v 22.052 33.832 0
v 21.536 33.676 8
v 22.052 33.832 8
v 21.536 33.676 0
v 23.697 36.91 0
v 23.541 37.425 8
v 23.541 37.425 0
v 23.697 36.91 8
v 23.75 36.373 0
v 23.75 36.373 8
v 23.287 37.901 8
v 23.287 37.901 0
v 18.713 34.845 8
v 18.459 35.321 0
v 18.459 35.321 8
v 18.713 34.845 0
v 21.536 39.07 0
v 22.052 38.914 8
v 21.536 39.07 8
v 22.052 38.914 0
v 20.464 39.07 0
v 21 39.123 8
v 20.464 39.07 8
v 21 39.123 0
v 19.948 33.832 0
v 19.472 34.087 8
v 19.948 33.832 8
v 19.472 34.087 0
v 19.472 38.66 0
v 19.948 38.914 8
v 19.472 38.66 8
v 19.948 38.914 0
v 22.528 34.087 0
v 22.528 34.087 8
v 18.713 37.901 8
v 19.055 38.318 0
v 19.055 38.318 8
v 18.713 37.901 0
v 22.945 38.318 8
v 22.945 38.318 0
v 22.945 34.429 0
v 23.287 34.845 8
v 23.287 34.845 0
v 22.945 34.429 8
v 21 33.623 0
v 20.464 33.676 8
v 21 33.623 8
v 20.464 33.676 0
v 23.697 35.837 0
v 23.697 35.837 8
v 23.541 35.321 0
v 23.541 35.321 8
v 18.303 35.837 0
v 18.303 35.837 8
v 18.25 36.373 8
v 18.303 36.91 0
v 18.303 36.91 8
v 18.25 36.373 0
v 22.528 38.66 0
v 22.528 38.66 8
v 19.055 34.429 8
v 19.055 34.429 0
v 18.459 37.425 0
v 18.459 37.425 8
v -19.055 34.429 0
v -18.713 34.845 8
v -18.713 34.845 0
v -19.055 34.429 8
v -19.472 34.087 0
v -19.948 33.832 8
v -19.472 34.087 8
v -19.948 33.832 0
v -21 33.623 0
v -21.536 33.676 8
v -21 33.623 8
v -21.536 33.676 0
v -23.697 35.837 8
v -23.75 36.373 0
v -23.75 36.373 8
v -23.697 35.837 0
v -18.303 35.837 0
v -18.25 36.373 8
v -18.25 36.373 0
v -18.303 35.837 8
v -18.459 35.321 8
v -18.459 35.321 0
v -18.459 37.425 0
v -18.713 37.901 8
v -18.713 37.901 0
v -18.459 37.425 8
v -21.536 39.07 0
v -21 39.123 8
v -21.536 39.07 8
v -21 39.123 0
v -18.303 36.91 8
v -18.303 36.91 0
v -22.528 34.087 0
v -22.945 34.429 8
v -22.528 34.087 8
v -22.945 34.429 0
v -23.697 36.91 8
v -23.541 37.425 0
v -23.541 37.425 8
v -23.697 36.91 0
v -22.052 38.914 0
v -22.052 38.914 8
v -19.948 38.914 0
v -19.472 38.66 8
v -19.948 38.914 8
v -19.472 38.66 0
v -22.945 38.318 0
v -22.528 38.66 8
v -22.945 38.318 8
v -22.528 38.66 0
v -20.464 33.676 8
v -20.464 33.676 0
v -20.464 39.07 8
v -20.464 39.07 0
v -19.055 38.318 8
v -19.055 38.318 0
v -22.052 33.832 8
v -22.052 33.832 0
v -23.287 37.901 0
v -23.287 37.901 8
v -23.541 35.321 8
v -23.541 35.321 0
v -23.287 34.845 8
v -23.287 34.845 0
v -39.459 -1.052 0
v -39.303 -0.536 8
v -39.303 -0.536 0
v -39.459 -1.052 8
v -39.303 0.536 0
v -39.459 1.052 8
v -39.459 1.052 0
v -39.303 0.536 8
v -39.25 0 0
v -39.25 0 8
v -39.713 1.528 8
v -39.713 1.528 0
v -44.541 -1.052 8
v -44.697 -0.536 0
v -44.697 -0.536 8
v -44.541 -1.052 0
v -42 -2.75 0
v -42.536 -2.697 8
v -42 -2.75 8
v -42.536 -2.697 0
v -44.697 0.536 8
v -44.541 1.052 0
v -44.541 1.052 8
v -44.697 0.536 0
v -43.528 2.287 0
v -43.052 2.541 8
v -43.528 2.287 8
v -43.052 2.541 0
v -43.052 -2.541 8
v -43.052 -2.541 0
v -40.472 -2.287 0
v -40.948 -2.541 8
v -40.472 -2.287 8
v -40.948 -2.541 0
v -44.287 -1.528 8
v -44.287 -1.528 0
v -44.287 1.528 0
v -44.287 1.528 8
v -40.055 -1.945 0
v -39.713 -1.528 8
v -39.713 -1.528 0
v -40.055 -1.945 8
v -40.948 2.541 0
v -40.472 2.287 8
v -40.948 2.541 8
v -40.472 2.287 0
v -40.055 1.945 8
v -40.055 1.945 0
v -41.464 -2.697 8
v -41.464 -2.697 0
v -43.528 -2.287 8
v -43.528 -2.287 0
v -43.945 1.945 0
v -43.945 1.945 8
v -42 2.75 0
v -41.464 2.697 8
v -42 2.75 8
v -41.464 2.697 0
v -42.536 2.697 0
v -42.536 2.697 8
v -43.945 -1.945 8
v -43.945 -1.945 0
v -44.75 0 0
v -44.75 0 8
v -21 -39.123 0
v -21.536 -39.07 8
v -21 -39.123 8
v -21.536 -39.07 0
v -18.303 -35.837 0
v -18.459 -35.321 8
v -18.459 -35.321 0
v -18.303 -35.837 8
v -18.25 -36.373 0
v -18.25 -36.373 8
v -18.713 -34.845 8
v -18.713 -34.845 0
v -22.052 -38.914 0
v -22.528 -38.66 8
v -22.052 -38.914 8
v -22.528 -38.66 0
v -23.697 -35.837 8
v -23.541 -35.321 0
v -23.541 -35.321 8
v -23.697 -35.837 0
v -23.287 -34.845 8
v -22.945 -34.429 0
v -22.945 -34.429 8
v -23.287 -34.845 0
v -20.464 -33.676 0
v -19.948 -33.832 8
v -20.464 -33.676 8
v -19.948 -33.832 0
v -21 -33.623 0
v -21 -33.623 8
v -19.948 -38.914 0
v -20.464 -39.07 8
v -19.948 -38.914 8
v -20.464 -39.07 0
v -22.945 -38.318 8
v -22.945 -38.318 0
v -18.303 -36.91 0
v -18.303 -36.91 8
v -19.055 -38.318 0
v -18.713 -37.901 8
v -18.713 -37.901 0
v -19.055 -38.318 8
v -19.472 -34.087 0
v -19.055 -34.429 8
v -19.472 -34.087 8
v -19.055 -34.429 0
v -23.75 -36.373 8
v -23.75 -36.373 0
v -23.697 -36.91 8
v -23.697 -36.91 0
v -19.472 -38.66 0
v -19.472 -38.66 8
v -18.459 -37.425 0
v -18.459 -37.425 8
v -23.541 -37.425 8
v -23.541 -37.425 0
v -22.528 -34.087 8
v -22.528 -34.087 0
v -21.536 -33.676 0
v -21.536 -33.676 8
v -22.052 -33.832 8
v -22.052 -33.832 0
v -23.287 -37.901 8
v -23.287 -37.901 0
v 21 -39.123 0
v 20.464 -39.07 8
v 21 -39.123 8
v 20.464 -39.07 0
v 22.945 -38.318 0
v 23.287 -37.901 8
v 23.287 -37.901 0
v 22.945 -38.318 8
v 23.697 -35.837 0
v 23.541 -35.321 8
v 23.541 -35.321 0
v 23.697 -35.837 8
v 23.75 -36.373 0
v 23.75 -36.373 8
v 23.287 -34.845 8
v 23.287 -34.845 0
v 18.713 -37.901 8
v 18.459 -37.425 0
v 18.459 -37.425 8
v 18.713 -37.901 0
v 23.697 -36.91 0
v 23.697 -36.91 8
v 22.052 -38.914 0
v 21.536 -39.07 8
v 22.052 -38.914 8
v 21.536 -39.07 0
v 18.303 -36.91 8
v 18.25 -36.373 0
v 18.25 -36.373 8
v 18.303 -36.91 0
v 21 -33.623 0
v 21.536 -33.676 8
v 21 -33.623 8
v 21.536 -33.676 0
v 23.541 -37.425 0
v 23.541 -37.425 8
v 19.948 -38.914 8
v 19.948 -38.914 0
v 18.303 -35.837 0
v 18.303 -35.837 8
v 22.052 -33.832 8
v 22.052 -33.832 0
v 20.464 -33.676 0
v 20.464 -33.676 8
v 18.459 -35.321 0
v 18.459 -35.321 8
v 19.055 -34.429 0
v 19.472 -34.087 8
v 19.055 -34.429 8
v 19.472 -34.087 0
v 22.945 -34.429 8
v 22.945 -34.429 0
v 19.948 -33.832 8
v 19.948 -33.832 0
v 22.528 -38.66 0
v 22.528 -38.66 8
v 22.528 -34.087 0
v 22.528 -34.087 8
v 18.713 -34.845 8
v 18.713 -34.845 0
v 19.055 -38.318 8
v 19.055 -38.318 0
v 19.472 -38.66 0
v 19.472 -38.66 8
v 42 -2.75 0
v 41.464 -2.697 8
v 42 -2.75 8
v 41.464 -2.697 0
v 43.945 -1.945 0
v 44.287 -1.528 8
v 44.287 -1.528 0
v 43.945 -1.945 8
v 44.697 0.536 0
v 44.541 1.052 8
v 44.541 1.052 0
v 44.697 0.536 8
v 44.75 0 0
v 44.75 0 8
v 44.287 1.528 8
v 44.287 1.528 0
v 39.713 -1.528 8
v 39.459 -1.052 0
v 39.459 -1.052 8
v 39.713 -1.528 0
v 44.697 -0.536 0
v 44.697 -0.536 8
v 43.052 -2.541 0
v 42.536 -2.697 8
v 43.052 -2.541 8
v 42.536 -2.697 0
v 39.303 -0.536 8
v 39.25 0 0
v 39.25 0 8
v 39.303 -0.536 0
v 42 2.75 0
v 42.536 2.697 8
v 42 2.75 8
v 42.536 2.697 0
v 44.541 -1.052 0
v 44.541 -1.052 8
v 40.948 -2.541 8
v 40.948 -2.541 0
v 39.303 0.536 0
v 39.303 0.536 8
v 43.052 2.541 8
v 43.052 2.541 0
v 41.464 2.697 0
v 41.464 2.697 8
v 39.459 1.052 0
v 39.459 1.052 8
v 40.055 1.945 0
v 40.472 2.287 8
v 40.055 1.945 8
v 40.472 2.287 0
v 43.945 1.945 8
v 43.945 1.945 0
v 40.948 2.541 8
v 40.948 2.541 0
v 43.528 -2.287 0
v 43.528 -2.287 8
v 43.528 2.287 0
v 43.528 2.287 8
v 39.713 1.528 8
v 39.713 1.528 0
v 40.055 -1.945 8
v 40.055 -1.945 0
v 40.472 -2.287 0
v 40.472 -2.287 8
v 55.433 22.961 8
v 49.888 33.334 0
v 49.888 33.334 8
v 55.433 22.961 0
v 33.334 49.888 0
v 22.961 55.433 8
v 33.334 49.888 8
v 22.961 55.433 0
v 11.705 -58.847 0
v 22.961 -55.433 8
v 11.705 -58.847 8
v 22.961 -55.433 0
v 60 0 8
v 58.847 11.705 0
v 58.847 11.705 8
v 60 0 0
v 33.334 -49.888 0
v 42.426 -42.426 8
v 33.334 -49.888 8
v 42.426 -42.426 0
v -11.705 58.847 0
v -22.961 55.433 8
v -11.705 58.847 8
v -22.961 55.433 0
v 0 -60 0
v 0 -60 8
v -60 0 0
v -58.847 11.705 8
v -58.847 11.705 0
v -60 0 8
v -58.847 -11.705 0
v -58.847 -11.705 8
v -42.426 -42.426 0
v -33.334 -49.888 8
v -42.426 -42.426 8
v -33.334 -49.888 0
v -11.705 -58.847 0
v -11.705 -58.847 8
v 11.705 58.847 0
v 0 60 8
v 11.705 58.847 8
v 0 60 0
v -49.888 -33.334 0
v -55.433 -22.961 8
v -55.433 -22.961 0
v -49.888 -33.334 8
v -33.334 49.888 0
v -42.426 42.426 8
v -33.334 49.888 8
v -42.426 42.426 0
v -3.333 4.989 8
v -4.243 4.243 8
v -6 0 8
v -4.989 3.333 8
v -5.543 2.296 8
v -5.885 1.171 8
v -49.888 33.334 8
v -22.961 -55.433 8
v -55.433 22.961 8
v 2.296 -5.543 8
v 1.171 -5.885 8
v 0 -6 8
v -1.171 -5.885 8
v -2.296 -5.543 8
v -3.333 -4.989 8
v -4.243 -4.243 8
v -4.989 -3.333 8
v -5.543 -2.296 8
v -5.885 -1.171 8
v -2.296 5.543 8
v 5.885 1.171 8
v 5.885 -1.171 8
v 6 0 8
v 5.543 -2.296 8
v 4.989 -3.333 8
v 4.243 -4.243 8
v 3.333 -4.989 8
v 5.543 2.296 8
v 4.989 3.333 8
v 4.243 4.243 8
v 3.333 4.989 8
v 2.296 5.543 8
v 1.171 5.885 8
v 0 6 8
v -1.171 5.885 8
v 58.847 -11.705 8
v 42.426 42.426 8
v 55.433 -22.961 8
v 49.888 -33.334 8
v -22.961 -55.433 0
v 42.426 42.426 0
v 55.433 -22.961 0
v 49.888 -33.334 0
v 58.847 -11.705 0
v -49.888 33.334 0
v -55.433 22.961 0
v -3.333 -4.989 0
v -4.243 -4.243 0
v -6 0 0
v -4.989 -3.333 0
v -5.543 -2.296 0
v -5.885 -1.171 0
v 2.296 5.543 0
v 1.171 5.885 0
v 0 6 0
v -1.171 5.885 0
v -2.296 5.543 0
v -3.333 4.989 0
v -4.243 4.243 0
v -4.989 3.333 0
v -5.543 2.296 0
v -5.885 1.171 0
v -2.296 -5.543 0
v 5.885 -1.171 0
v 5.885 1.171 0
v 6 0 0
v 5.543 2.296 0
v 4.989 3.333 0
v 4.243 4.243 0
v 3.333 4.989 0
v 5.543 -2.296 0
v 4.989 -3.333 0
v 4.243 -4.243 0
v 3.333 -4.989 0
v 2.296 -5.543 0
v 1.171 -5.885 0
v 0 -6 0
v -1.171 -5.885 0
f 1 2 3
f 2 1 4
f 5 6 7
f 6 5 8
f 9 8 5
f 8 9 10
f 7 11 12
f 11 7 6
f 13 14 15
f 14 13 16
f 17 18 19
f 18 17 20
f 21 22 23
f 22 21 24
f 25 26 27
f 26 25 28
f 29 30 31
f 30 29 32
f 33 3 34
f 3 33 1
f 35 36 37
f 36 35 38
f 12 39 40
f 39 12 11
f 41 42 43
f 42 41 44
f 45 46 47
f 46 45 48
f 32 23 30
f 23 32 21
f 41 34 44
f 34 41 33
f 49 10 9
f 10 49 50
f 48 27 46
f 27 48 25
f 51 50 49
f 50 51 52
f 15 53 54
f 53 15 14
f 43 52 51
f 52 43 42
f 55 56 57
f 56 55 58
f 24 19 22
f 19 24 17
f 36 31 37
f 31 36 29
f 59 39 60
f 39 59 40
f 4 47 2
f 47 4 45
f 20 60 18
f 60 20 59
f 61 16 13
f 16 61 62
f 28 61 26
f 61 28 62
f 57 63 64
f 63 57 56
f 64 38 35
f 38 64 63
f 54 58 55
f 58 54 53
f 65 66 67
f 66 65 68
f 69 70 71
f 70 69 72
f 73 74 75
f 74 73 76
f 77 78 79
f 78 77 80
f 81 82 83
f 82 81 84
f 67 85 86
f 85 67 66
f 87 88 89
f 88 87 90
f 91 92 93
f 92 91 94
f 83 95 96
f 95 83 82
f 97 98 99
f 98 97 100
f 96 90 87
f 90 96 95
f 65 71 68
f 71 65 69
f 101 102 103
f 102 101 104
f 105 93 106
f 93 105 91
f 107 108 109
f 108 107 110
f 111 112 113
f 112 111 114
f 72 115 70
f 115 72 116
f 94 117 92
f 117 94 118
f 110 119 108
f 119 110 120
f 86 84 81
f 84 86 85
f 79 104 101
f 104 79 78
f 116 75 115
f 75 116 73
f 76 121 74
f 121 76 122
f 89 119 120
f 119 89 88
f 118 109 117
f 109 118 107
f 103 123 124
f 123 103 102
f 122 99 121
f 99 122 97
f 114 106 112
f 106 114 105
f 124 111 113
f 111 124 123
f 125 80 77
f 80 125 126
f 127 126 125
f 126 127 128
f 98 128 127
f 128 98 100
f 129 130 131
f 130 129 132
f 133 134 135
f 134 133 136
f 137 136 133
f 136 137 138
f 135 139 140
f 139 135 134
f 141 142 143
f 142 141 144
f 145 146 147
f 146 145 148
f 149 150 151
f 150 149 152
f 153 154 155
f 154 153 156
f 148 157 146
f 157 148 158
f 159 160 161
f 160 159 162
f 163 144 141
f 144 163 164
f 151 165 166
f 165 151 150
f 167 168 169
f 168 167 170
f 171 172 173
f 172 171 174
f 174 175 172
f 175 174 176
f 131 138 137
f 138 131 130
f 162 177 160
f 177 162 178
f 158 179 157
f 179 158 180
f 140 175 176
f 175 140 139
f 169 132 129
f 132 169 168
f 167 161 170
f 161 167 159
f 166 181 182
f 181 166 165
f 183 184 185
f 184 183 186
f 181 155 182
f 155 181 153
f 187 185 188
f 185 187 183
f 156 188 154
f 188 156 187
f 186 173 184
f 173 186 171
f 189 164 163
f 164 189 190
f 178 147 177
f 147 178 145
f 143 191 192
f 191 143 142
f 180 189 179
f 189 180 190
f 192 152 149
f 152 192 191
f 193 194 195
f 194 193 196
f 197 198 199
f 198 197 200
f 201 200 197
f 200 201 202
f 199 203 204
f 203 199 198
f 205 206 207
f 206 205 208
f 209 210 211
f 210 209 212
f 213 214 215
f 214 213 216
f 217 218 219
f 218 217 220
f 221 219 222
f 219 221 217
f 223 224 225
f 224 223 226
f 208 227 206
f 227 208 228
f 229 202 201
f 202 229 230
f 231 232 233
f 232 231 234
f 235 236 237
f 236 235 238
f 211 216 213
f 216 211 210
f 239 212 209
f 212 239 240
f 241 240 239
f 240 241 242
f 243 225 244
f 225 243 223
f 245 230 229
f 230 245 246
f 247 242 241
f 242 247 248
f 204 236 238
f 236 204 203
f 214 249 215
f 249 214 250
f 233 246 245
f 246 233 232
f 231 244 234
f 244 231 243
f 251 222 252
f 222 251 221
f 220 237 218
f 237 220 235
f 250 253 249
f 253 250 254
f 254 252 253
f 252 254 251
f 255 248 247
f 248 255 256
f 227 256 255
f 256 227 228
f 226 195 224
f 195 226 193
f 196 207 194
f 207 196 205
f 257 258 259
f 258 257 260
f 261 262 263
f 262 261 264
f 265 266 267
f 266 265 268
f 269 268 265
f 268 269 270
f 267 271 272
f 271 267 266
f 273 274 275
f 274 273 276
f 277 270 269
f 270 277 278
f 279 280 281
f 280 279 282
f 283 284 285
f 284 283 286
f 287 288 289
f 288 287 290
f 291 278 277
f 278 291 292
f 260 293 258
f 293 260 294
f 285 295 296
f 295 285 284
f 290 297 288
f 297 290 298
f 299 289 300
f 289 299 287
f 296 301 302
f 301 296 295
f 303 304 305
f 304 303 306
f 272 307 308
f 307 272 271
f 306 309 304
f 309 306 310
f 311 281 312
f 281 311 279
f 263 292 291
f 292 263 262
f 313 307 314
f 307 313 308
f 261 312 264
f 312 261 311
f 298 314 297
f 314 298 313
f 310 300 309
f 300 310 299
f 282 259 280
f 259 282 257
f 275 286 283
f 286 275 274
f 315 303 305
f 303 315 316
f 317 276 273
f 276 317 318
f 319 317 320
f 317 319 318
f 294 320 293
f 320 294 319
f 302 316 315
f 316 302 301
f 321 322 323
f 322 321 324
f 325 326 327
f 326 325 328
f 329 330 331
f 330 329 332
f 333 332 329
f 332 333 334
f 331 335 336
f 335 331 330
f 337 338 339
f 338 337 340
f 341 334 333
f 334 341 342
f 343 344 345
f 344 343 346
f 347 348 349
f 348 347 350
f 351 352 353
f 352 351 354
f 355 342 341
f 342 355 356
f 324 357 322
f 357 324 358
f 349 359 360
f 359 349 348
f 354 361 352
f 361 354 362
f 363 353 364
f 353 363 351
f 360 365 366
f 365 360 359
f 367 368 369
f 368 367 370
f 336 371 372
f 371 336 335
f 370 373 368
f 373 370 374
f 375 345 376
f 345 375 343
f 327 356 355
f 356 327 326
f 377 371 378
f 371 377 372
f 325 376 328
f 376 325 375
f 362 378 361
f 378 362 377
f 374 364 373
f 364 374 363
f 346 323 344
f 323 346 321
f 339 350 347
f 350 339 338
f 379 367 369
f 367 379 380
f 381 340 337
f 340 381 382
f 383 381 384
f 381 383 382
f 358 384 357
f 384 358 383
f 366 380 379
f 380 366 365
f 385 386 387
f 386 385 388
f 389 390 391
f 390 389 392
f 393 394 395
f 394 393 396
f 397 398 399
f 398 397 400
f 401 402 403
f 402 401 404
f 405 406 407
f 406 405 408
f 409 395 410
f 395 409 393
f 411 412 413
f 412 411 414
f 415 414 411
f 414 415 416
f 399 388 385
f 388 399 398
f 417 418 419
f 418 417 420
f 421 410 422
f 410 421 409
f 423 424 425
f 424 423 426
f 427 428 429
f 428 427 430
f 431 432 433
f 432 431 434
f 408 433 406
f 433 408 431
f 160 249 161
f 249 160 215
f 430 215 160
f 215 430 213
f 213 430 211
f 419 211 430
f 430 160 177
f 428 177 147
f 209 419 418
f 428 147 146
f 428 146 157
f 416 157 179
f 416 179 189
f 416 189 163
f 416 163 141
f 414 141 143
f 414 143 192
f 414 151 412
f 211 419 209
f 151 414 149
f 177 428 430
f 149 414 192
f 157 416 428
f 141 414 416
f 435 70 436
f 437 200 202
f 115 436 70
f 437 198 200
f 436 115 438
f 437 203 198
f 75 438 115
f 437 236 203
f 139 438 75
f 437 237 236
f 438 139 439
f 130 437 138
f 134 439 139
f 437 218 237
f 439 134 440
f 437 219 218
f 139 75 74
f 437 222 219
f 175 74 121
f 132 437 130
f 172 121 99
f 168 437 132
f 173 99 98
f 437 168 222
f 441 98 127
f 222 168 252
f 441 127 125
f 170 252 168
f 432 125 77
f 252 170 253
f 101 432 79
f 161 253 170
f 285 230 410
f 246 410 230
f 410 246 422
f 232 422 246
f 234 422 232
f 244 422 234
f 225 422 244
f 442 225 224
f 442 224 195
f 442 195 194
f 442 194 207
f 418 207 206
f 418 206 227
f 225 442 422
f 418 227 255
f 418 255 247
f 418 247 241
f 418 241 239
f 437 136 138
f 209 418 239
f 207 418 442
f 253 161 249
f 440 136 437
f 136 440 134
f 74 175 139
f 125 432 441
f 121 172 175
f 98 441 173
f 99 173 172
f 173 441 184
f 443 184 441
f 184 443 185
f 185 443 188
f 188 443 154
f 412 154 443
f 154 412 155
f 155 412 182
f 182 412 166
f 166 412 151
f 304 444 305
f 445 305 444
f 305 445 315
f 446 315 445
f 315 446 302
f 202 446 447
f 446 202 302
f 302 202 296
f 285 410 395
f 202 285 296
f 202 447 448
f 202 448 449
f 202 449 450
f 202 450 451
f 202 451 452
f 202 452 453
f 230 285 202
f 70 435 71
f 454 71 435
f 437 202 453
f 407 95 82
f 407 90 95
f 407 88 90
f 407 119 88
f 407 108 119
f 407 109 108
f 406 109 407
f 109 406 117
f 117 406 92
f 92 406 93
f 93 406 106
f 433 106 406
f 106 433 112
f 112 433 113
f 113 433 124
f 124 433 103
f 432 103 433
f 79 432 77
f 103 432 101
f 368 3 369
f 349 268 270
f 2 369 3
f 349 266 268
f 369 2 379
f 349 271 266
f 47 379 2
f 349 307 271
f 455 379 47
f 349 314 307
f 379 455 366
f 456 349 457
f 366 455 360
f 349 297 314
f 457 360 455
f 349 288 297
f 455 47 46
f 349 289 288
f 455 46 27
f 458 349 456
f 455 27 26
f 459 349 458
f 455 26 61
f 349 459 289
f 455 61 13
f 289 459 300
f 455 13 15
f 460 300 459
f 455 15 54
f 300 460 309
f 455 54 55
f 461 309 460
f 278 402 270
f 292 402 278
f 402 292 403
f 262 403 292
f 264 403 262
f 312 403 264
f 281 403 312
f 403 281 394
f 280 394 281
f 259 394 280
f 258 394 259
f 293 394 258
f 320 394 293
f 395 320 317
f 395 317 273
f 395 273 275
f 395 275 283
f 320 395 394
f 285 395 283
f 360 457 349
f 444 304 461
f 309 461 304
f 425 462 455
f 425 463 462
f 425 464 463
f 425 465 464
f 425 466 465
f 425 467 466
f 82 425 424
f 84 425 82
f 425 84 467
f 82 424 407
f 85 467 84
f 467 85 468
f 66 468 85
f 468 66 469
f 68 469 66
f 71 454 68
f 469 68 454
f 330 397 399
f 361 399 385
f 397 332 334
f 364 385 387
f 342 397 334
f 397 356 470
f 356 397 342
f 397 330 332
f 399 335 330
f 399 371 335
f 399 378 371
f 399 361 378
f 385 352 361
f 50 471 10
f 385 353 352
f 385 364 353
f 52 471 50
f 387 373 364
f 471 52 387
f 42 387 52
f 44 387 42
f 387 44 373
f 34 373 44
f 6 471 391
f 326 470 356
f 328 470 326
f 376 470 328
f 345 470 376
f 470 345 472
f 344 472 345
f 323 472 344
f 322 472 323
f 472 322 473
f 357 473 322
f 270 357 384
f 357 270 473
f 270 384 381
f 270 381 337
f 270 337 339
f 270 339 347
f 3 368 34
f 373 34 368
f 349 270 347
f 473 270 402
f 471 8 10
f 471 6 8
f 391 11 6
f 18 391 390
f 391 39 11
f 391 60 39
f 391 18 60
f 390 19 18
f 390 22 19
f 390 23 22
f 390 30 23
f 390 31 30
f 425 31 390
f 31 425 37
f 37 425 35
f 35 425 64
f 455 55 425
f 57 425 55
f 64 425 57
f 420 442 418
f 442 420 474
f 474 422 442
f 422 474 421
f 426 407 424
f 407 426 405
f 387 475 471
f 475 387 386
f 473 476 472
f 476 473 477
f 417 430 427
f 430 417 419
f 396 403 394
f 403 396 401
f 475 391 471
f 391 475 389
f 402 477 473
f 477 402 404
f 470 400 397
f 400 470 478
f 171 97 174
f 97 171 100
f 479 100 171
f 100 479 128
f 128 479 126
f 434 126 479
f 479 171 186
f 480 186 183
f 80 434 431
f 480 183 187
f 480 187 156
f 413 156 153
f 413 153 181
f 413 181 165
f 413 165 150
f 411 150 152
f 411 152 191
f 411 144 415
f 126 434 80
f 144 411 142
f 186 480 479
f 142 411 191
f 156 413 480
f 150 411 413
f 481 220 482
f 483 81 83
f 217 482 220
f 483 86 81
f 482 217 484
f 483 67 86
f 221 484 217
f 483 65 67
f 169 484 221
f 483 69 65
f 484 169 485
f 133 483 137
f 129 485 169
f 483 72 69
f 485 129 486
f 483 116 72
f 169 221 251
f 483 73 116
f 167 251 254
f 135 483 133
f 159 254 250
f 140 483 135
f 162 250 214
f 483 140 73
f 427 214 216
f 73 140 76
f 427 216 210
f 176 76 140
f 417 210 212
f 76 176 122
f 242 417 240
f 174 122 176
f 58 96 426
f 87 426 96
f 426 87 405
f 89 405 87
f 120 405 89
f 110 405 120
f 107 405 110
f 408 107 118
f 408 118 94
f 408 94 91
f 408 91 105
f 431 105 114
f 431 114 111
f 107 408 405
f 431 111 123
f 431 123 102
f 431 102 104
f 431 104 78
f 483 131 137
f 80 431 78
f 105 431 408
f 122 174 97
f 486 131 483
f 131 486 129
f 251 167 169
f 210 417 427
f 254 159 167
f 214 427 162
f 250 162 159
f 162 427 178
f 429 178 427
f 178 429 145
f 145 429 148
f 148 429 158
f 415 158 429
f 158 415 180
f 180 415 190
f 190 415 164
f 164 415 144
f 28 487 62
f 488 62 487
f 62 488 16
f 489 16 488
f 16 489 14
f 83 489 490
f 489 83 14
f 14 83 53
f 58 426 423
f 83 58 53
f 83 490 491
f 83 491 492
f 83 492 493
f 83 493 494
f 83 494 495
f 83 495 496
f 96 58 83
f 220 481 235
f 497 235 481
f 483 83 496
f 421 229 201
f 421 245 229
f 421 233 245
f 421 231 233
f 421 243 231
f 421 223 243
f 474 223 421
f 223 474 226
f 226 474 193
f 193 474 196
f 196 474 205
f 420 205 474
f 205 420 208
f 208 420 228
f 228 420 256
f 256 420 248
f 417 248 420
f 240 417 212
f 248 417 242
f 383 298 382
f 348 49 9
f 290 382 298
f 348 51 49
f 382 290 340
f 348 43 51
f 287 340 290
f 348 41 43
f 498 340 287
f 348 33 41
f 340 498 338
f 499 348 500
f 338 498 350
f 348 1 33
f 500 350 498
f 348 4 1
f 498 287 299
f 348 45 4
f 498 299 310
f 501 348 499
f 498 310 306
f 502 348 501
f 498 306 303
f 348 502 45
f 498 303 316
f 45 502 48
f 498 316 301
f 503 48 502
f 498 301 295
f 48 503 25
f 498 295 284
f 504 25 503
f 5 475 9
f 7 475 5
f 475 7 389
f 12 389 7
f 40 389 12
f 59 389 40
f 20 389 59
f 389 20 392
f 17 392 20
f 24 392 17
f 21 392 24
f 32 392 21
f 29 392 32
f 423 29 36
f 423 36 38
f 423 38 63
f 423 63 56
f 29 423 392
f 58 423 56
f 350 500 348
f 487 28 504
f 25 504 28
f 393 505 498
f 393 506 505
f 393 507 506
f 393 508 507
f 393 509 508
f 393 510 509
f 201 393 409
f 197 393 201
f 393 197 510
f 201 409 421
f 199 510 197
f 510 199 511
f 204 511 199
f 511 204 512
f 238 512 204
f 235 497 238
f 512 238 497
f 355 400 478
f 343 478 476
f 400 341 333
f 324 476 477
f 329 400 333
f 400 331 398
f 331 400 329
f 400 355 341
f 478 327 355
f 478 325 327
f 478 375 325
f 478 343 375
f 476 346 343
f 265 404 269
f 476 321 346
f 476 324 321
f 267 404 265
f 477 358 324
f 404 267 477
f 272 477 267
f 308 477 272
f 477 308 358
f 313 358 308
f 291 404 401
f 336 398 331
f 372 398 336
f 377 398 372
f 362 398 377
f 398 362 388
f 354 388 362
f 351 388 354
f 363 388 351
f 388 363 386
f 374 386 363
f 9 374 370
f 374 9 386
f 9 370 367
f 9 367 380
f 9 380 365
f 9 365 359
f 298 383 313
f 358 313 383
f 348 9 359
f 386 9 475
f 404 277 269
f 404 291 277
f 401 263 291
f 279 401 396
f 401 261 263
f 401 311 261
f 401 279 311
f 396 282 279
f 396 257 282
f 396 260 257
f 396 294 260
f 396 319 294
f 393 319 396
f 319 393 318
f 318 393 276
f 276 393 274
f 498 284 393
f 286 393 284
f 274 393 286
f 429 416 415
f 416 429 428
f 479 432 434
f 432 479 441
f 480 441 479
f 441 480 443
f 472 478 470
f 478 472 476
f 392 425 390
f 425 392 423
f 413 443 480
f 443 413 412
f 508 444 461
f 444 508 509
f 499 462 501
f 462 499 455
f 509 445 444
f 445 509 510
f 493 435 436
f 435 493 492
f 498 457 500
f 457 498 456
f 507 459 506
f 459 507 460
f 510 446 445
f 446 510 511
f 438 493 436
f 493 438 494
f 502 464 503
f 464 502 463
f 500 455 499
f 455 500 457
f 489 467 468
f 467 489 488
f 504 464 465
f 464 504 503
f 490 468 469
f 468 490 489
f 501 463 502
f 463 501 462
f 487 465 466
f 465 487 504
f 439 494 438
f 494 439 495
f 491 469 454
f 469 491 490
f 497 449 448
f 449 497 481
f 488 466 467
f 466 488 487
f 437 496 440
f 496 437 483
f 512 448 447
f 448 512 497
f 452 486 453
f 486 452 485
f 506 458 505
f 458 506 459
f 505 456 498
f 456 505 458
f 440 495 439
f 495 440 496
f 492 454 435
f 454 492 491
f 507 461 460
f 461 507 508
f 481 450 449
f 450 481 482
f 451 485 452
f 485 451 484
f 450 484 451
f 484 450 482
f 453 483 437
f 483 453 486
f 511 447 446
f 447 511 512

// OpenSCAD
$fn = 32;

// ----------------------------------------------------------------------
// Flange Ø120 x 8
// 6 holes on a Ø84 bolt circle, bolted joints
// ----------------------------------------------------------------------

// --- parameters (mm) ---
flange_d = 120;  // outside diameter of the flange
thickness = 8;   // flange thickness
holes = 6;       // number of bolt holes
pcd = 84;        // bolt circle diameter
start_deg = 60;  // angle of the first hole, from +X
hole_d = 5.5;    // bolt hole diameter
bore_d = 12;     // central through bore
hub_d = 22;      // hub outside diameter
hub_h = 0;       // hub height above the flange face (0 = no hub)

// --- derived feature positions (mm) ---
height = thickness + hub_h;  // = 8   overall height of the part
pcd_r = pcd / 2;             // = 42   bolt circle radius
hole_step = 360 / holes;     // = 60   angular pitch
feature_centers = [
  [pcd_r * cos(start_deg + 0 * hole_step), pcd_r * sin(start_deg + 0 * hole_step)],
  [pcd_r * cos(start_deg + 1 * hole_step), pcd_r * sin(start_deg + 1 * hole_step)],
  [pcd_r * cos(start_deg + 2 * hole_step), pcd_r * sin(start_deg + 2 * hole_step)],
  [pcd_r * cos(start_deg + 3 * hole_step), pcd_r * sin(start_deg + 3 * hole_step)],
  [pcd_r * cos(start_deg + 4 * hole_step), pcd_r * sin(start_deg + 4 * hole_step)],
  [pcd_r * cos(start_deg + 5 * hole_step), pcd_r * sin(start_deg + 5 * hole_step)]
];   // bolt hole centres on the pitch circle

// flange disc, every hole and the bore cut straight through
difference() {
  union() {
    cylinder(d = flange_d, h = thickness);
  }
  translate([0, 0, -1]) cylinder(d = bore_d, h = height + 2);  // bore, through
  for (centre = feature_centers)
    translate([centre[0], centre[1], -1]) cylinder(d = hole_d, h = thickness + 2);
}
